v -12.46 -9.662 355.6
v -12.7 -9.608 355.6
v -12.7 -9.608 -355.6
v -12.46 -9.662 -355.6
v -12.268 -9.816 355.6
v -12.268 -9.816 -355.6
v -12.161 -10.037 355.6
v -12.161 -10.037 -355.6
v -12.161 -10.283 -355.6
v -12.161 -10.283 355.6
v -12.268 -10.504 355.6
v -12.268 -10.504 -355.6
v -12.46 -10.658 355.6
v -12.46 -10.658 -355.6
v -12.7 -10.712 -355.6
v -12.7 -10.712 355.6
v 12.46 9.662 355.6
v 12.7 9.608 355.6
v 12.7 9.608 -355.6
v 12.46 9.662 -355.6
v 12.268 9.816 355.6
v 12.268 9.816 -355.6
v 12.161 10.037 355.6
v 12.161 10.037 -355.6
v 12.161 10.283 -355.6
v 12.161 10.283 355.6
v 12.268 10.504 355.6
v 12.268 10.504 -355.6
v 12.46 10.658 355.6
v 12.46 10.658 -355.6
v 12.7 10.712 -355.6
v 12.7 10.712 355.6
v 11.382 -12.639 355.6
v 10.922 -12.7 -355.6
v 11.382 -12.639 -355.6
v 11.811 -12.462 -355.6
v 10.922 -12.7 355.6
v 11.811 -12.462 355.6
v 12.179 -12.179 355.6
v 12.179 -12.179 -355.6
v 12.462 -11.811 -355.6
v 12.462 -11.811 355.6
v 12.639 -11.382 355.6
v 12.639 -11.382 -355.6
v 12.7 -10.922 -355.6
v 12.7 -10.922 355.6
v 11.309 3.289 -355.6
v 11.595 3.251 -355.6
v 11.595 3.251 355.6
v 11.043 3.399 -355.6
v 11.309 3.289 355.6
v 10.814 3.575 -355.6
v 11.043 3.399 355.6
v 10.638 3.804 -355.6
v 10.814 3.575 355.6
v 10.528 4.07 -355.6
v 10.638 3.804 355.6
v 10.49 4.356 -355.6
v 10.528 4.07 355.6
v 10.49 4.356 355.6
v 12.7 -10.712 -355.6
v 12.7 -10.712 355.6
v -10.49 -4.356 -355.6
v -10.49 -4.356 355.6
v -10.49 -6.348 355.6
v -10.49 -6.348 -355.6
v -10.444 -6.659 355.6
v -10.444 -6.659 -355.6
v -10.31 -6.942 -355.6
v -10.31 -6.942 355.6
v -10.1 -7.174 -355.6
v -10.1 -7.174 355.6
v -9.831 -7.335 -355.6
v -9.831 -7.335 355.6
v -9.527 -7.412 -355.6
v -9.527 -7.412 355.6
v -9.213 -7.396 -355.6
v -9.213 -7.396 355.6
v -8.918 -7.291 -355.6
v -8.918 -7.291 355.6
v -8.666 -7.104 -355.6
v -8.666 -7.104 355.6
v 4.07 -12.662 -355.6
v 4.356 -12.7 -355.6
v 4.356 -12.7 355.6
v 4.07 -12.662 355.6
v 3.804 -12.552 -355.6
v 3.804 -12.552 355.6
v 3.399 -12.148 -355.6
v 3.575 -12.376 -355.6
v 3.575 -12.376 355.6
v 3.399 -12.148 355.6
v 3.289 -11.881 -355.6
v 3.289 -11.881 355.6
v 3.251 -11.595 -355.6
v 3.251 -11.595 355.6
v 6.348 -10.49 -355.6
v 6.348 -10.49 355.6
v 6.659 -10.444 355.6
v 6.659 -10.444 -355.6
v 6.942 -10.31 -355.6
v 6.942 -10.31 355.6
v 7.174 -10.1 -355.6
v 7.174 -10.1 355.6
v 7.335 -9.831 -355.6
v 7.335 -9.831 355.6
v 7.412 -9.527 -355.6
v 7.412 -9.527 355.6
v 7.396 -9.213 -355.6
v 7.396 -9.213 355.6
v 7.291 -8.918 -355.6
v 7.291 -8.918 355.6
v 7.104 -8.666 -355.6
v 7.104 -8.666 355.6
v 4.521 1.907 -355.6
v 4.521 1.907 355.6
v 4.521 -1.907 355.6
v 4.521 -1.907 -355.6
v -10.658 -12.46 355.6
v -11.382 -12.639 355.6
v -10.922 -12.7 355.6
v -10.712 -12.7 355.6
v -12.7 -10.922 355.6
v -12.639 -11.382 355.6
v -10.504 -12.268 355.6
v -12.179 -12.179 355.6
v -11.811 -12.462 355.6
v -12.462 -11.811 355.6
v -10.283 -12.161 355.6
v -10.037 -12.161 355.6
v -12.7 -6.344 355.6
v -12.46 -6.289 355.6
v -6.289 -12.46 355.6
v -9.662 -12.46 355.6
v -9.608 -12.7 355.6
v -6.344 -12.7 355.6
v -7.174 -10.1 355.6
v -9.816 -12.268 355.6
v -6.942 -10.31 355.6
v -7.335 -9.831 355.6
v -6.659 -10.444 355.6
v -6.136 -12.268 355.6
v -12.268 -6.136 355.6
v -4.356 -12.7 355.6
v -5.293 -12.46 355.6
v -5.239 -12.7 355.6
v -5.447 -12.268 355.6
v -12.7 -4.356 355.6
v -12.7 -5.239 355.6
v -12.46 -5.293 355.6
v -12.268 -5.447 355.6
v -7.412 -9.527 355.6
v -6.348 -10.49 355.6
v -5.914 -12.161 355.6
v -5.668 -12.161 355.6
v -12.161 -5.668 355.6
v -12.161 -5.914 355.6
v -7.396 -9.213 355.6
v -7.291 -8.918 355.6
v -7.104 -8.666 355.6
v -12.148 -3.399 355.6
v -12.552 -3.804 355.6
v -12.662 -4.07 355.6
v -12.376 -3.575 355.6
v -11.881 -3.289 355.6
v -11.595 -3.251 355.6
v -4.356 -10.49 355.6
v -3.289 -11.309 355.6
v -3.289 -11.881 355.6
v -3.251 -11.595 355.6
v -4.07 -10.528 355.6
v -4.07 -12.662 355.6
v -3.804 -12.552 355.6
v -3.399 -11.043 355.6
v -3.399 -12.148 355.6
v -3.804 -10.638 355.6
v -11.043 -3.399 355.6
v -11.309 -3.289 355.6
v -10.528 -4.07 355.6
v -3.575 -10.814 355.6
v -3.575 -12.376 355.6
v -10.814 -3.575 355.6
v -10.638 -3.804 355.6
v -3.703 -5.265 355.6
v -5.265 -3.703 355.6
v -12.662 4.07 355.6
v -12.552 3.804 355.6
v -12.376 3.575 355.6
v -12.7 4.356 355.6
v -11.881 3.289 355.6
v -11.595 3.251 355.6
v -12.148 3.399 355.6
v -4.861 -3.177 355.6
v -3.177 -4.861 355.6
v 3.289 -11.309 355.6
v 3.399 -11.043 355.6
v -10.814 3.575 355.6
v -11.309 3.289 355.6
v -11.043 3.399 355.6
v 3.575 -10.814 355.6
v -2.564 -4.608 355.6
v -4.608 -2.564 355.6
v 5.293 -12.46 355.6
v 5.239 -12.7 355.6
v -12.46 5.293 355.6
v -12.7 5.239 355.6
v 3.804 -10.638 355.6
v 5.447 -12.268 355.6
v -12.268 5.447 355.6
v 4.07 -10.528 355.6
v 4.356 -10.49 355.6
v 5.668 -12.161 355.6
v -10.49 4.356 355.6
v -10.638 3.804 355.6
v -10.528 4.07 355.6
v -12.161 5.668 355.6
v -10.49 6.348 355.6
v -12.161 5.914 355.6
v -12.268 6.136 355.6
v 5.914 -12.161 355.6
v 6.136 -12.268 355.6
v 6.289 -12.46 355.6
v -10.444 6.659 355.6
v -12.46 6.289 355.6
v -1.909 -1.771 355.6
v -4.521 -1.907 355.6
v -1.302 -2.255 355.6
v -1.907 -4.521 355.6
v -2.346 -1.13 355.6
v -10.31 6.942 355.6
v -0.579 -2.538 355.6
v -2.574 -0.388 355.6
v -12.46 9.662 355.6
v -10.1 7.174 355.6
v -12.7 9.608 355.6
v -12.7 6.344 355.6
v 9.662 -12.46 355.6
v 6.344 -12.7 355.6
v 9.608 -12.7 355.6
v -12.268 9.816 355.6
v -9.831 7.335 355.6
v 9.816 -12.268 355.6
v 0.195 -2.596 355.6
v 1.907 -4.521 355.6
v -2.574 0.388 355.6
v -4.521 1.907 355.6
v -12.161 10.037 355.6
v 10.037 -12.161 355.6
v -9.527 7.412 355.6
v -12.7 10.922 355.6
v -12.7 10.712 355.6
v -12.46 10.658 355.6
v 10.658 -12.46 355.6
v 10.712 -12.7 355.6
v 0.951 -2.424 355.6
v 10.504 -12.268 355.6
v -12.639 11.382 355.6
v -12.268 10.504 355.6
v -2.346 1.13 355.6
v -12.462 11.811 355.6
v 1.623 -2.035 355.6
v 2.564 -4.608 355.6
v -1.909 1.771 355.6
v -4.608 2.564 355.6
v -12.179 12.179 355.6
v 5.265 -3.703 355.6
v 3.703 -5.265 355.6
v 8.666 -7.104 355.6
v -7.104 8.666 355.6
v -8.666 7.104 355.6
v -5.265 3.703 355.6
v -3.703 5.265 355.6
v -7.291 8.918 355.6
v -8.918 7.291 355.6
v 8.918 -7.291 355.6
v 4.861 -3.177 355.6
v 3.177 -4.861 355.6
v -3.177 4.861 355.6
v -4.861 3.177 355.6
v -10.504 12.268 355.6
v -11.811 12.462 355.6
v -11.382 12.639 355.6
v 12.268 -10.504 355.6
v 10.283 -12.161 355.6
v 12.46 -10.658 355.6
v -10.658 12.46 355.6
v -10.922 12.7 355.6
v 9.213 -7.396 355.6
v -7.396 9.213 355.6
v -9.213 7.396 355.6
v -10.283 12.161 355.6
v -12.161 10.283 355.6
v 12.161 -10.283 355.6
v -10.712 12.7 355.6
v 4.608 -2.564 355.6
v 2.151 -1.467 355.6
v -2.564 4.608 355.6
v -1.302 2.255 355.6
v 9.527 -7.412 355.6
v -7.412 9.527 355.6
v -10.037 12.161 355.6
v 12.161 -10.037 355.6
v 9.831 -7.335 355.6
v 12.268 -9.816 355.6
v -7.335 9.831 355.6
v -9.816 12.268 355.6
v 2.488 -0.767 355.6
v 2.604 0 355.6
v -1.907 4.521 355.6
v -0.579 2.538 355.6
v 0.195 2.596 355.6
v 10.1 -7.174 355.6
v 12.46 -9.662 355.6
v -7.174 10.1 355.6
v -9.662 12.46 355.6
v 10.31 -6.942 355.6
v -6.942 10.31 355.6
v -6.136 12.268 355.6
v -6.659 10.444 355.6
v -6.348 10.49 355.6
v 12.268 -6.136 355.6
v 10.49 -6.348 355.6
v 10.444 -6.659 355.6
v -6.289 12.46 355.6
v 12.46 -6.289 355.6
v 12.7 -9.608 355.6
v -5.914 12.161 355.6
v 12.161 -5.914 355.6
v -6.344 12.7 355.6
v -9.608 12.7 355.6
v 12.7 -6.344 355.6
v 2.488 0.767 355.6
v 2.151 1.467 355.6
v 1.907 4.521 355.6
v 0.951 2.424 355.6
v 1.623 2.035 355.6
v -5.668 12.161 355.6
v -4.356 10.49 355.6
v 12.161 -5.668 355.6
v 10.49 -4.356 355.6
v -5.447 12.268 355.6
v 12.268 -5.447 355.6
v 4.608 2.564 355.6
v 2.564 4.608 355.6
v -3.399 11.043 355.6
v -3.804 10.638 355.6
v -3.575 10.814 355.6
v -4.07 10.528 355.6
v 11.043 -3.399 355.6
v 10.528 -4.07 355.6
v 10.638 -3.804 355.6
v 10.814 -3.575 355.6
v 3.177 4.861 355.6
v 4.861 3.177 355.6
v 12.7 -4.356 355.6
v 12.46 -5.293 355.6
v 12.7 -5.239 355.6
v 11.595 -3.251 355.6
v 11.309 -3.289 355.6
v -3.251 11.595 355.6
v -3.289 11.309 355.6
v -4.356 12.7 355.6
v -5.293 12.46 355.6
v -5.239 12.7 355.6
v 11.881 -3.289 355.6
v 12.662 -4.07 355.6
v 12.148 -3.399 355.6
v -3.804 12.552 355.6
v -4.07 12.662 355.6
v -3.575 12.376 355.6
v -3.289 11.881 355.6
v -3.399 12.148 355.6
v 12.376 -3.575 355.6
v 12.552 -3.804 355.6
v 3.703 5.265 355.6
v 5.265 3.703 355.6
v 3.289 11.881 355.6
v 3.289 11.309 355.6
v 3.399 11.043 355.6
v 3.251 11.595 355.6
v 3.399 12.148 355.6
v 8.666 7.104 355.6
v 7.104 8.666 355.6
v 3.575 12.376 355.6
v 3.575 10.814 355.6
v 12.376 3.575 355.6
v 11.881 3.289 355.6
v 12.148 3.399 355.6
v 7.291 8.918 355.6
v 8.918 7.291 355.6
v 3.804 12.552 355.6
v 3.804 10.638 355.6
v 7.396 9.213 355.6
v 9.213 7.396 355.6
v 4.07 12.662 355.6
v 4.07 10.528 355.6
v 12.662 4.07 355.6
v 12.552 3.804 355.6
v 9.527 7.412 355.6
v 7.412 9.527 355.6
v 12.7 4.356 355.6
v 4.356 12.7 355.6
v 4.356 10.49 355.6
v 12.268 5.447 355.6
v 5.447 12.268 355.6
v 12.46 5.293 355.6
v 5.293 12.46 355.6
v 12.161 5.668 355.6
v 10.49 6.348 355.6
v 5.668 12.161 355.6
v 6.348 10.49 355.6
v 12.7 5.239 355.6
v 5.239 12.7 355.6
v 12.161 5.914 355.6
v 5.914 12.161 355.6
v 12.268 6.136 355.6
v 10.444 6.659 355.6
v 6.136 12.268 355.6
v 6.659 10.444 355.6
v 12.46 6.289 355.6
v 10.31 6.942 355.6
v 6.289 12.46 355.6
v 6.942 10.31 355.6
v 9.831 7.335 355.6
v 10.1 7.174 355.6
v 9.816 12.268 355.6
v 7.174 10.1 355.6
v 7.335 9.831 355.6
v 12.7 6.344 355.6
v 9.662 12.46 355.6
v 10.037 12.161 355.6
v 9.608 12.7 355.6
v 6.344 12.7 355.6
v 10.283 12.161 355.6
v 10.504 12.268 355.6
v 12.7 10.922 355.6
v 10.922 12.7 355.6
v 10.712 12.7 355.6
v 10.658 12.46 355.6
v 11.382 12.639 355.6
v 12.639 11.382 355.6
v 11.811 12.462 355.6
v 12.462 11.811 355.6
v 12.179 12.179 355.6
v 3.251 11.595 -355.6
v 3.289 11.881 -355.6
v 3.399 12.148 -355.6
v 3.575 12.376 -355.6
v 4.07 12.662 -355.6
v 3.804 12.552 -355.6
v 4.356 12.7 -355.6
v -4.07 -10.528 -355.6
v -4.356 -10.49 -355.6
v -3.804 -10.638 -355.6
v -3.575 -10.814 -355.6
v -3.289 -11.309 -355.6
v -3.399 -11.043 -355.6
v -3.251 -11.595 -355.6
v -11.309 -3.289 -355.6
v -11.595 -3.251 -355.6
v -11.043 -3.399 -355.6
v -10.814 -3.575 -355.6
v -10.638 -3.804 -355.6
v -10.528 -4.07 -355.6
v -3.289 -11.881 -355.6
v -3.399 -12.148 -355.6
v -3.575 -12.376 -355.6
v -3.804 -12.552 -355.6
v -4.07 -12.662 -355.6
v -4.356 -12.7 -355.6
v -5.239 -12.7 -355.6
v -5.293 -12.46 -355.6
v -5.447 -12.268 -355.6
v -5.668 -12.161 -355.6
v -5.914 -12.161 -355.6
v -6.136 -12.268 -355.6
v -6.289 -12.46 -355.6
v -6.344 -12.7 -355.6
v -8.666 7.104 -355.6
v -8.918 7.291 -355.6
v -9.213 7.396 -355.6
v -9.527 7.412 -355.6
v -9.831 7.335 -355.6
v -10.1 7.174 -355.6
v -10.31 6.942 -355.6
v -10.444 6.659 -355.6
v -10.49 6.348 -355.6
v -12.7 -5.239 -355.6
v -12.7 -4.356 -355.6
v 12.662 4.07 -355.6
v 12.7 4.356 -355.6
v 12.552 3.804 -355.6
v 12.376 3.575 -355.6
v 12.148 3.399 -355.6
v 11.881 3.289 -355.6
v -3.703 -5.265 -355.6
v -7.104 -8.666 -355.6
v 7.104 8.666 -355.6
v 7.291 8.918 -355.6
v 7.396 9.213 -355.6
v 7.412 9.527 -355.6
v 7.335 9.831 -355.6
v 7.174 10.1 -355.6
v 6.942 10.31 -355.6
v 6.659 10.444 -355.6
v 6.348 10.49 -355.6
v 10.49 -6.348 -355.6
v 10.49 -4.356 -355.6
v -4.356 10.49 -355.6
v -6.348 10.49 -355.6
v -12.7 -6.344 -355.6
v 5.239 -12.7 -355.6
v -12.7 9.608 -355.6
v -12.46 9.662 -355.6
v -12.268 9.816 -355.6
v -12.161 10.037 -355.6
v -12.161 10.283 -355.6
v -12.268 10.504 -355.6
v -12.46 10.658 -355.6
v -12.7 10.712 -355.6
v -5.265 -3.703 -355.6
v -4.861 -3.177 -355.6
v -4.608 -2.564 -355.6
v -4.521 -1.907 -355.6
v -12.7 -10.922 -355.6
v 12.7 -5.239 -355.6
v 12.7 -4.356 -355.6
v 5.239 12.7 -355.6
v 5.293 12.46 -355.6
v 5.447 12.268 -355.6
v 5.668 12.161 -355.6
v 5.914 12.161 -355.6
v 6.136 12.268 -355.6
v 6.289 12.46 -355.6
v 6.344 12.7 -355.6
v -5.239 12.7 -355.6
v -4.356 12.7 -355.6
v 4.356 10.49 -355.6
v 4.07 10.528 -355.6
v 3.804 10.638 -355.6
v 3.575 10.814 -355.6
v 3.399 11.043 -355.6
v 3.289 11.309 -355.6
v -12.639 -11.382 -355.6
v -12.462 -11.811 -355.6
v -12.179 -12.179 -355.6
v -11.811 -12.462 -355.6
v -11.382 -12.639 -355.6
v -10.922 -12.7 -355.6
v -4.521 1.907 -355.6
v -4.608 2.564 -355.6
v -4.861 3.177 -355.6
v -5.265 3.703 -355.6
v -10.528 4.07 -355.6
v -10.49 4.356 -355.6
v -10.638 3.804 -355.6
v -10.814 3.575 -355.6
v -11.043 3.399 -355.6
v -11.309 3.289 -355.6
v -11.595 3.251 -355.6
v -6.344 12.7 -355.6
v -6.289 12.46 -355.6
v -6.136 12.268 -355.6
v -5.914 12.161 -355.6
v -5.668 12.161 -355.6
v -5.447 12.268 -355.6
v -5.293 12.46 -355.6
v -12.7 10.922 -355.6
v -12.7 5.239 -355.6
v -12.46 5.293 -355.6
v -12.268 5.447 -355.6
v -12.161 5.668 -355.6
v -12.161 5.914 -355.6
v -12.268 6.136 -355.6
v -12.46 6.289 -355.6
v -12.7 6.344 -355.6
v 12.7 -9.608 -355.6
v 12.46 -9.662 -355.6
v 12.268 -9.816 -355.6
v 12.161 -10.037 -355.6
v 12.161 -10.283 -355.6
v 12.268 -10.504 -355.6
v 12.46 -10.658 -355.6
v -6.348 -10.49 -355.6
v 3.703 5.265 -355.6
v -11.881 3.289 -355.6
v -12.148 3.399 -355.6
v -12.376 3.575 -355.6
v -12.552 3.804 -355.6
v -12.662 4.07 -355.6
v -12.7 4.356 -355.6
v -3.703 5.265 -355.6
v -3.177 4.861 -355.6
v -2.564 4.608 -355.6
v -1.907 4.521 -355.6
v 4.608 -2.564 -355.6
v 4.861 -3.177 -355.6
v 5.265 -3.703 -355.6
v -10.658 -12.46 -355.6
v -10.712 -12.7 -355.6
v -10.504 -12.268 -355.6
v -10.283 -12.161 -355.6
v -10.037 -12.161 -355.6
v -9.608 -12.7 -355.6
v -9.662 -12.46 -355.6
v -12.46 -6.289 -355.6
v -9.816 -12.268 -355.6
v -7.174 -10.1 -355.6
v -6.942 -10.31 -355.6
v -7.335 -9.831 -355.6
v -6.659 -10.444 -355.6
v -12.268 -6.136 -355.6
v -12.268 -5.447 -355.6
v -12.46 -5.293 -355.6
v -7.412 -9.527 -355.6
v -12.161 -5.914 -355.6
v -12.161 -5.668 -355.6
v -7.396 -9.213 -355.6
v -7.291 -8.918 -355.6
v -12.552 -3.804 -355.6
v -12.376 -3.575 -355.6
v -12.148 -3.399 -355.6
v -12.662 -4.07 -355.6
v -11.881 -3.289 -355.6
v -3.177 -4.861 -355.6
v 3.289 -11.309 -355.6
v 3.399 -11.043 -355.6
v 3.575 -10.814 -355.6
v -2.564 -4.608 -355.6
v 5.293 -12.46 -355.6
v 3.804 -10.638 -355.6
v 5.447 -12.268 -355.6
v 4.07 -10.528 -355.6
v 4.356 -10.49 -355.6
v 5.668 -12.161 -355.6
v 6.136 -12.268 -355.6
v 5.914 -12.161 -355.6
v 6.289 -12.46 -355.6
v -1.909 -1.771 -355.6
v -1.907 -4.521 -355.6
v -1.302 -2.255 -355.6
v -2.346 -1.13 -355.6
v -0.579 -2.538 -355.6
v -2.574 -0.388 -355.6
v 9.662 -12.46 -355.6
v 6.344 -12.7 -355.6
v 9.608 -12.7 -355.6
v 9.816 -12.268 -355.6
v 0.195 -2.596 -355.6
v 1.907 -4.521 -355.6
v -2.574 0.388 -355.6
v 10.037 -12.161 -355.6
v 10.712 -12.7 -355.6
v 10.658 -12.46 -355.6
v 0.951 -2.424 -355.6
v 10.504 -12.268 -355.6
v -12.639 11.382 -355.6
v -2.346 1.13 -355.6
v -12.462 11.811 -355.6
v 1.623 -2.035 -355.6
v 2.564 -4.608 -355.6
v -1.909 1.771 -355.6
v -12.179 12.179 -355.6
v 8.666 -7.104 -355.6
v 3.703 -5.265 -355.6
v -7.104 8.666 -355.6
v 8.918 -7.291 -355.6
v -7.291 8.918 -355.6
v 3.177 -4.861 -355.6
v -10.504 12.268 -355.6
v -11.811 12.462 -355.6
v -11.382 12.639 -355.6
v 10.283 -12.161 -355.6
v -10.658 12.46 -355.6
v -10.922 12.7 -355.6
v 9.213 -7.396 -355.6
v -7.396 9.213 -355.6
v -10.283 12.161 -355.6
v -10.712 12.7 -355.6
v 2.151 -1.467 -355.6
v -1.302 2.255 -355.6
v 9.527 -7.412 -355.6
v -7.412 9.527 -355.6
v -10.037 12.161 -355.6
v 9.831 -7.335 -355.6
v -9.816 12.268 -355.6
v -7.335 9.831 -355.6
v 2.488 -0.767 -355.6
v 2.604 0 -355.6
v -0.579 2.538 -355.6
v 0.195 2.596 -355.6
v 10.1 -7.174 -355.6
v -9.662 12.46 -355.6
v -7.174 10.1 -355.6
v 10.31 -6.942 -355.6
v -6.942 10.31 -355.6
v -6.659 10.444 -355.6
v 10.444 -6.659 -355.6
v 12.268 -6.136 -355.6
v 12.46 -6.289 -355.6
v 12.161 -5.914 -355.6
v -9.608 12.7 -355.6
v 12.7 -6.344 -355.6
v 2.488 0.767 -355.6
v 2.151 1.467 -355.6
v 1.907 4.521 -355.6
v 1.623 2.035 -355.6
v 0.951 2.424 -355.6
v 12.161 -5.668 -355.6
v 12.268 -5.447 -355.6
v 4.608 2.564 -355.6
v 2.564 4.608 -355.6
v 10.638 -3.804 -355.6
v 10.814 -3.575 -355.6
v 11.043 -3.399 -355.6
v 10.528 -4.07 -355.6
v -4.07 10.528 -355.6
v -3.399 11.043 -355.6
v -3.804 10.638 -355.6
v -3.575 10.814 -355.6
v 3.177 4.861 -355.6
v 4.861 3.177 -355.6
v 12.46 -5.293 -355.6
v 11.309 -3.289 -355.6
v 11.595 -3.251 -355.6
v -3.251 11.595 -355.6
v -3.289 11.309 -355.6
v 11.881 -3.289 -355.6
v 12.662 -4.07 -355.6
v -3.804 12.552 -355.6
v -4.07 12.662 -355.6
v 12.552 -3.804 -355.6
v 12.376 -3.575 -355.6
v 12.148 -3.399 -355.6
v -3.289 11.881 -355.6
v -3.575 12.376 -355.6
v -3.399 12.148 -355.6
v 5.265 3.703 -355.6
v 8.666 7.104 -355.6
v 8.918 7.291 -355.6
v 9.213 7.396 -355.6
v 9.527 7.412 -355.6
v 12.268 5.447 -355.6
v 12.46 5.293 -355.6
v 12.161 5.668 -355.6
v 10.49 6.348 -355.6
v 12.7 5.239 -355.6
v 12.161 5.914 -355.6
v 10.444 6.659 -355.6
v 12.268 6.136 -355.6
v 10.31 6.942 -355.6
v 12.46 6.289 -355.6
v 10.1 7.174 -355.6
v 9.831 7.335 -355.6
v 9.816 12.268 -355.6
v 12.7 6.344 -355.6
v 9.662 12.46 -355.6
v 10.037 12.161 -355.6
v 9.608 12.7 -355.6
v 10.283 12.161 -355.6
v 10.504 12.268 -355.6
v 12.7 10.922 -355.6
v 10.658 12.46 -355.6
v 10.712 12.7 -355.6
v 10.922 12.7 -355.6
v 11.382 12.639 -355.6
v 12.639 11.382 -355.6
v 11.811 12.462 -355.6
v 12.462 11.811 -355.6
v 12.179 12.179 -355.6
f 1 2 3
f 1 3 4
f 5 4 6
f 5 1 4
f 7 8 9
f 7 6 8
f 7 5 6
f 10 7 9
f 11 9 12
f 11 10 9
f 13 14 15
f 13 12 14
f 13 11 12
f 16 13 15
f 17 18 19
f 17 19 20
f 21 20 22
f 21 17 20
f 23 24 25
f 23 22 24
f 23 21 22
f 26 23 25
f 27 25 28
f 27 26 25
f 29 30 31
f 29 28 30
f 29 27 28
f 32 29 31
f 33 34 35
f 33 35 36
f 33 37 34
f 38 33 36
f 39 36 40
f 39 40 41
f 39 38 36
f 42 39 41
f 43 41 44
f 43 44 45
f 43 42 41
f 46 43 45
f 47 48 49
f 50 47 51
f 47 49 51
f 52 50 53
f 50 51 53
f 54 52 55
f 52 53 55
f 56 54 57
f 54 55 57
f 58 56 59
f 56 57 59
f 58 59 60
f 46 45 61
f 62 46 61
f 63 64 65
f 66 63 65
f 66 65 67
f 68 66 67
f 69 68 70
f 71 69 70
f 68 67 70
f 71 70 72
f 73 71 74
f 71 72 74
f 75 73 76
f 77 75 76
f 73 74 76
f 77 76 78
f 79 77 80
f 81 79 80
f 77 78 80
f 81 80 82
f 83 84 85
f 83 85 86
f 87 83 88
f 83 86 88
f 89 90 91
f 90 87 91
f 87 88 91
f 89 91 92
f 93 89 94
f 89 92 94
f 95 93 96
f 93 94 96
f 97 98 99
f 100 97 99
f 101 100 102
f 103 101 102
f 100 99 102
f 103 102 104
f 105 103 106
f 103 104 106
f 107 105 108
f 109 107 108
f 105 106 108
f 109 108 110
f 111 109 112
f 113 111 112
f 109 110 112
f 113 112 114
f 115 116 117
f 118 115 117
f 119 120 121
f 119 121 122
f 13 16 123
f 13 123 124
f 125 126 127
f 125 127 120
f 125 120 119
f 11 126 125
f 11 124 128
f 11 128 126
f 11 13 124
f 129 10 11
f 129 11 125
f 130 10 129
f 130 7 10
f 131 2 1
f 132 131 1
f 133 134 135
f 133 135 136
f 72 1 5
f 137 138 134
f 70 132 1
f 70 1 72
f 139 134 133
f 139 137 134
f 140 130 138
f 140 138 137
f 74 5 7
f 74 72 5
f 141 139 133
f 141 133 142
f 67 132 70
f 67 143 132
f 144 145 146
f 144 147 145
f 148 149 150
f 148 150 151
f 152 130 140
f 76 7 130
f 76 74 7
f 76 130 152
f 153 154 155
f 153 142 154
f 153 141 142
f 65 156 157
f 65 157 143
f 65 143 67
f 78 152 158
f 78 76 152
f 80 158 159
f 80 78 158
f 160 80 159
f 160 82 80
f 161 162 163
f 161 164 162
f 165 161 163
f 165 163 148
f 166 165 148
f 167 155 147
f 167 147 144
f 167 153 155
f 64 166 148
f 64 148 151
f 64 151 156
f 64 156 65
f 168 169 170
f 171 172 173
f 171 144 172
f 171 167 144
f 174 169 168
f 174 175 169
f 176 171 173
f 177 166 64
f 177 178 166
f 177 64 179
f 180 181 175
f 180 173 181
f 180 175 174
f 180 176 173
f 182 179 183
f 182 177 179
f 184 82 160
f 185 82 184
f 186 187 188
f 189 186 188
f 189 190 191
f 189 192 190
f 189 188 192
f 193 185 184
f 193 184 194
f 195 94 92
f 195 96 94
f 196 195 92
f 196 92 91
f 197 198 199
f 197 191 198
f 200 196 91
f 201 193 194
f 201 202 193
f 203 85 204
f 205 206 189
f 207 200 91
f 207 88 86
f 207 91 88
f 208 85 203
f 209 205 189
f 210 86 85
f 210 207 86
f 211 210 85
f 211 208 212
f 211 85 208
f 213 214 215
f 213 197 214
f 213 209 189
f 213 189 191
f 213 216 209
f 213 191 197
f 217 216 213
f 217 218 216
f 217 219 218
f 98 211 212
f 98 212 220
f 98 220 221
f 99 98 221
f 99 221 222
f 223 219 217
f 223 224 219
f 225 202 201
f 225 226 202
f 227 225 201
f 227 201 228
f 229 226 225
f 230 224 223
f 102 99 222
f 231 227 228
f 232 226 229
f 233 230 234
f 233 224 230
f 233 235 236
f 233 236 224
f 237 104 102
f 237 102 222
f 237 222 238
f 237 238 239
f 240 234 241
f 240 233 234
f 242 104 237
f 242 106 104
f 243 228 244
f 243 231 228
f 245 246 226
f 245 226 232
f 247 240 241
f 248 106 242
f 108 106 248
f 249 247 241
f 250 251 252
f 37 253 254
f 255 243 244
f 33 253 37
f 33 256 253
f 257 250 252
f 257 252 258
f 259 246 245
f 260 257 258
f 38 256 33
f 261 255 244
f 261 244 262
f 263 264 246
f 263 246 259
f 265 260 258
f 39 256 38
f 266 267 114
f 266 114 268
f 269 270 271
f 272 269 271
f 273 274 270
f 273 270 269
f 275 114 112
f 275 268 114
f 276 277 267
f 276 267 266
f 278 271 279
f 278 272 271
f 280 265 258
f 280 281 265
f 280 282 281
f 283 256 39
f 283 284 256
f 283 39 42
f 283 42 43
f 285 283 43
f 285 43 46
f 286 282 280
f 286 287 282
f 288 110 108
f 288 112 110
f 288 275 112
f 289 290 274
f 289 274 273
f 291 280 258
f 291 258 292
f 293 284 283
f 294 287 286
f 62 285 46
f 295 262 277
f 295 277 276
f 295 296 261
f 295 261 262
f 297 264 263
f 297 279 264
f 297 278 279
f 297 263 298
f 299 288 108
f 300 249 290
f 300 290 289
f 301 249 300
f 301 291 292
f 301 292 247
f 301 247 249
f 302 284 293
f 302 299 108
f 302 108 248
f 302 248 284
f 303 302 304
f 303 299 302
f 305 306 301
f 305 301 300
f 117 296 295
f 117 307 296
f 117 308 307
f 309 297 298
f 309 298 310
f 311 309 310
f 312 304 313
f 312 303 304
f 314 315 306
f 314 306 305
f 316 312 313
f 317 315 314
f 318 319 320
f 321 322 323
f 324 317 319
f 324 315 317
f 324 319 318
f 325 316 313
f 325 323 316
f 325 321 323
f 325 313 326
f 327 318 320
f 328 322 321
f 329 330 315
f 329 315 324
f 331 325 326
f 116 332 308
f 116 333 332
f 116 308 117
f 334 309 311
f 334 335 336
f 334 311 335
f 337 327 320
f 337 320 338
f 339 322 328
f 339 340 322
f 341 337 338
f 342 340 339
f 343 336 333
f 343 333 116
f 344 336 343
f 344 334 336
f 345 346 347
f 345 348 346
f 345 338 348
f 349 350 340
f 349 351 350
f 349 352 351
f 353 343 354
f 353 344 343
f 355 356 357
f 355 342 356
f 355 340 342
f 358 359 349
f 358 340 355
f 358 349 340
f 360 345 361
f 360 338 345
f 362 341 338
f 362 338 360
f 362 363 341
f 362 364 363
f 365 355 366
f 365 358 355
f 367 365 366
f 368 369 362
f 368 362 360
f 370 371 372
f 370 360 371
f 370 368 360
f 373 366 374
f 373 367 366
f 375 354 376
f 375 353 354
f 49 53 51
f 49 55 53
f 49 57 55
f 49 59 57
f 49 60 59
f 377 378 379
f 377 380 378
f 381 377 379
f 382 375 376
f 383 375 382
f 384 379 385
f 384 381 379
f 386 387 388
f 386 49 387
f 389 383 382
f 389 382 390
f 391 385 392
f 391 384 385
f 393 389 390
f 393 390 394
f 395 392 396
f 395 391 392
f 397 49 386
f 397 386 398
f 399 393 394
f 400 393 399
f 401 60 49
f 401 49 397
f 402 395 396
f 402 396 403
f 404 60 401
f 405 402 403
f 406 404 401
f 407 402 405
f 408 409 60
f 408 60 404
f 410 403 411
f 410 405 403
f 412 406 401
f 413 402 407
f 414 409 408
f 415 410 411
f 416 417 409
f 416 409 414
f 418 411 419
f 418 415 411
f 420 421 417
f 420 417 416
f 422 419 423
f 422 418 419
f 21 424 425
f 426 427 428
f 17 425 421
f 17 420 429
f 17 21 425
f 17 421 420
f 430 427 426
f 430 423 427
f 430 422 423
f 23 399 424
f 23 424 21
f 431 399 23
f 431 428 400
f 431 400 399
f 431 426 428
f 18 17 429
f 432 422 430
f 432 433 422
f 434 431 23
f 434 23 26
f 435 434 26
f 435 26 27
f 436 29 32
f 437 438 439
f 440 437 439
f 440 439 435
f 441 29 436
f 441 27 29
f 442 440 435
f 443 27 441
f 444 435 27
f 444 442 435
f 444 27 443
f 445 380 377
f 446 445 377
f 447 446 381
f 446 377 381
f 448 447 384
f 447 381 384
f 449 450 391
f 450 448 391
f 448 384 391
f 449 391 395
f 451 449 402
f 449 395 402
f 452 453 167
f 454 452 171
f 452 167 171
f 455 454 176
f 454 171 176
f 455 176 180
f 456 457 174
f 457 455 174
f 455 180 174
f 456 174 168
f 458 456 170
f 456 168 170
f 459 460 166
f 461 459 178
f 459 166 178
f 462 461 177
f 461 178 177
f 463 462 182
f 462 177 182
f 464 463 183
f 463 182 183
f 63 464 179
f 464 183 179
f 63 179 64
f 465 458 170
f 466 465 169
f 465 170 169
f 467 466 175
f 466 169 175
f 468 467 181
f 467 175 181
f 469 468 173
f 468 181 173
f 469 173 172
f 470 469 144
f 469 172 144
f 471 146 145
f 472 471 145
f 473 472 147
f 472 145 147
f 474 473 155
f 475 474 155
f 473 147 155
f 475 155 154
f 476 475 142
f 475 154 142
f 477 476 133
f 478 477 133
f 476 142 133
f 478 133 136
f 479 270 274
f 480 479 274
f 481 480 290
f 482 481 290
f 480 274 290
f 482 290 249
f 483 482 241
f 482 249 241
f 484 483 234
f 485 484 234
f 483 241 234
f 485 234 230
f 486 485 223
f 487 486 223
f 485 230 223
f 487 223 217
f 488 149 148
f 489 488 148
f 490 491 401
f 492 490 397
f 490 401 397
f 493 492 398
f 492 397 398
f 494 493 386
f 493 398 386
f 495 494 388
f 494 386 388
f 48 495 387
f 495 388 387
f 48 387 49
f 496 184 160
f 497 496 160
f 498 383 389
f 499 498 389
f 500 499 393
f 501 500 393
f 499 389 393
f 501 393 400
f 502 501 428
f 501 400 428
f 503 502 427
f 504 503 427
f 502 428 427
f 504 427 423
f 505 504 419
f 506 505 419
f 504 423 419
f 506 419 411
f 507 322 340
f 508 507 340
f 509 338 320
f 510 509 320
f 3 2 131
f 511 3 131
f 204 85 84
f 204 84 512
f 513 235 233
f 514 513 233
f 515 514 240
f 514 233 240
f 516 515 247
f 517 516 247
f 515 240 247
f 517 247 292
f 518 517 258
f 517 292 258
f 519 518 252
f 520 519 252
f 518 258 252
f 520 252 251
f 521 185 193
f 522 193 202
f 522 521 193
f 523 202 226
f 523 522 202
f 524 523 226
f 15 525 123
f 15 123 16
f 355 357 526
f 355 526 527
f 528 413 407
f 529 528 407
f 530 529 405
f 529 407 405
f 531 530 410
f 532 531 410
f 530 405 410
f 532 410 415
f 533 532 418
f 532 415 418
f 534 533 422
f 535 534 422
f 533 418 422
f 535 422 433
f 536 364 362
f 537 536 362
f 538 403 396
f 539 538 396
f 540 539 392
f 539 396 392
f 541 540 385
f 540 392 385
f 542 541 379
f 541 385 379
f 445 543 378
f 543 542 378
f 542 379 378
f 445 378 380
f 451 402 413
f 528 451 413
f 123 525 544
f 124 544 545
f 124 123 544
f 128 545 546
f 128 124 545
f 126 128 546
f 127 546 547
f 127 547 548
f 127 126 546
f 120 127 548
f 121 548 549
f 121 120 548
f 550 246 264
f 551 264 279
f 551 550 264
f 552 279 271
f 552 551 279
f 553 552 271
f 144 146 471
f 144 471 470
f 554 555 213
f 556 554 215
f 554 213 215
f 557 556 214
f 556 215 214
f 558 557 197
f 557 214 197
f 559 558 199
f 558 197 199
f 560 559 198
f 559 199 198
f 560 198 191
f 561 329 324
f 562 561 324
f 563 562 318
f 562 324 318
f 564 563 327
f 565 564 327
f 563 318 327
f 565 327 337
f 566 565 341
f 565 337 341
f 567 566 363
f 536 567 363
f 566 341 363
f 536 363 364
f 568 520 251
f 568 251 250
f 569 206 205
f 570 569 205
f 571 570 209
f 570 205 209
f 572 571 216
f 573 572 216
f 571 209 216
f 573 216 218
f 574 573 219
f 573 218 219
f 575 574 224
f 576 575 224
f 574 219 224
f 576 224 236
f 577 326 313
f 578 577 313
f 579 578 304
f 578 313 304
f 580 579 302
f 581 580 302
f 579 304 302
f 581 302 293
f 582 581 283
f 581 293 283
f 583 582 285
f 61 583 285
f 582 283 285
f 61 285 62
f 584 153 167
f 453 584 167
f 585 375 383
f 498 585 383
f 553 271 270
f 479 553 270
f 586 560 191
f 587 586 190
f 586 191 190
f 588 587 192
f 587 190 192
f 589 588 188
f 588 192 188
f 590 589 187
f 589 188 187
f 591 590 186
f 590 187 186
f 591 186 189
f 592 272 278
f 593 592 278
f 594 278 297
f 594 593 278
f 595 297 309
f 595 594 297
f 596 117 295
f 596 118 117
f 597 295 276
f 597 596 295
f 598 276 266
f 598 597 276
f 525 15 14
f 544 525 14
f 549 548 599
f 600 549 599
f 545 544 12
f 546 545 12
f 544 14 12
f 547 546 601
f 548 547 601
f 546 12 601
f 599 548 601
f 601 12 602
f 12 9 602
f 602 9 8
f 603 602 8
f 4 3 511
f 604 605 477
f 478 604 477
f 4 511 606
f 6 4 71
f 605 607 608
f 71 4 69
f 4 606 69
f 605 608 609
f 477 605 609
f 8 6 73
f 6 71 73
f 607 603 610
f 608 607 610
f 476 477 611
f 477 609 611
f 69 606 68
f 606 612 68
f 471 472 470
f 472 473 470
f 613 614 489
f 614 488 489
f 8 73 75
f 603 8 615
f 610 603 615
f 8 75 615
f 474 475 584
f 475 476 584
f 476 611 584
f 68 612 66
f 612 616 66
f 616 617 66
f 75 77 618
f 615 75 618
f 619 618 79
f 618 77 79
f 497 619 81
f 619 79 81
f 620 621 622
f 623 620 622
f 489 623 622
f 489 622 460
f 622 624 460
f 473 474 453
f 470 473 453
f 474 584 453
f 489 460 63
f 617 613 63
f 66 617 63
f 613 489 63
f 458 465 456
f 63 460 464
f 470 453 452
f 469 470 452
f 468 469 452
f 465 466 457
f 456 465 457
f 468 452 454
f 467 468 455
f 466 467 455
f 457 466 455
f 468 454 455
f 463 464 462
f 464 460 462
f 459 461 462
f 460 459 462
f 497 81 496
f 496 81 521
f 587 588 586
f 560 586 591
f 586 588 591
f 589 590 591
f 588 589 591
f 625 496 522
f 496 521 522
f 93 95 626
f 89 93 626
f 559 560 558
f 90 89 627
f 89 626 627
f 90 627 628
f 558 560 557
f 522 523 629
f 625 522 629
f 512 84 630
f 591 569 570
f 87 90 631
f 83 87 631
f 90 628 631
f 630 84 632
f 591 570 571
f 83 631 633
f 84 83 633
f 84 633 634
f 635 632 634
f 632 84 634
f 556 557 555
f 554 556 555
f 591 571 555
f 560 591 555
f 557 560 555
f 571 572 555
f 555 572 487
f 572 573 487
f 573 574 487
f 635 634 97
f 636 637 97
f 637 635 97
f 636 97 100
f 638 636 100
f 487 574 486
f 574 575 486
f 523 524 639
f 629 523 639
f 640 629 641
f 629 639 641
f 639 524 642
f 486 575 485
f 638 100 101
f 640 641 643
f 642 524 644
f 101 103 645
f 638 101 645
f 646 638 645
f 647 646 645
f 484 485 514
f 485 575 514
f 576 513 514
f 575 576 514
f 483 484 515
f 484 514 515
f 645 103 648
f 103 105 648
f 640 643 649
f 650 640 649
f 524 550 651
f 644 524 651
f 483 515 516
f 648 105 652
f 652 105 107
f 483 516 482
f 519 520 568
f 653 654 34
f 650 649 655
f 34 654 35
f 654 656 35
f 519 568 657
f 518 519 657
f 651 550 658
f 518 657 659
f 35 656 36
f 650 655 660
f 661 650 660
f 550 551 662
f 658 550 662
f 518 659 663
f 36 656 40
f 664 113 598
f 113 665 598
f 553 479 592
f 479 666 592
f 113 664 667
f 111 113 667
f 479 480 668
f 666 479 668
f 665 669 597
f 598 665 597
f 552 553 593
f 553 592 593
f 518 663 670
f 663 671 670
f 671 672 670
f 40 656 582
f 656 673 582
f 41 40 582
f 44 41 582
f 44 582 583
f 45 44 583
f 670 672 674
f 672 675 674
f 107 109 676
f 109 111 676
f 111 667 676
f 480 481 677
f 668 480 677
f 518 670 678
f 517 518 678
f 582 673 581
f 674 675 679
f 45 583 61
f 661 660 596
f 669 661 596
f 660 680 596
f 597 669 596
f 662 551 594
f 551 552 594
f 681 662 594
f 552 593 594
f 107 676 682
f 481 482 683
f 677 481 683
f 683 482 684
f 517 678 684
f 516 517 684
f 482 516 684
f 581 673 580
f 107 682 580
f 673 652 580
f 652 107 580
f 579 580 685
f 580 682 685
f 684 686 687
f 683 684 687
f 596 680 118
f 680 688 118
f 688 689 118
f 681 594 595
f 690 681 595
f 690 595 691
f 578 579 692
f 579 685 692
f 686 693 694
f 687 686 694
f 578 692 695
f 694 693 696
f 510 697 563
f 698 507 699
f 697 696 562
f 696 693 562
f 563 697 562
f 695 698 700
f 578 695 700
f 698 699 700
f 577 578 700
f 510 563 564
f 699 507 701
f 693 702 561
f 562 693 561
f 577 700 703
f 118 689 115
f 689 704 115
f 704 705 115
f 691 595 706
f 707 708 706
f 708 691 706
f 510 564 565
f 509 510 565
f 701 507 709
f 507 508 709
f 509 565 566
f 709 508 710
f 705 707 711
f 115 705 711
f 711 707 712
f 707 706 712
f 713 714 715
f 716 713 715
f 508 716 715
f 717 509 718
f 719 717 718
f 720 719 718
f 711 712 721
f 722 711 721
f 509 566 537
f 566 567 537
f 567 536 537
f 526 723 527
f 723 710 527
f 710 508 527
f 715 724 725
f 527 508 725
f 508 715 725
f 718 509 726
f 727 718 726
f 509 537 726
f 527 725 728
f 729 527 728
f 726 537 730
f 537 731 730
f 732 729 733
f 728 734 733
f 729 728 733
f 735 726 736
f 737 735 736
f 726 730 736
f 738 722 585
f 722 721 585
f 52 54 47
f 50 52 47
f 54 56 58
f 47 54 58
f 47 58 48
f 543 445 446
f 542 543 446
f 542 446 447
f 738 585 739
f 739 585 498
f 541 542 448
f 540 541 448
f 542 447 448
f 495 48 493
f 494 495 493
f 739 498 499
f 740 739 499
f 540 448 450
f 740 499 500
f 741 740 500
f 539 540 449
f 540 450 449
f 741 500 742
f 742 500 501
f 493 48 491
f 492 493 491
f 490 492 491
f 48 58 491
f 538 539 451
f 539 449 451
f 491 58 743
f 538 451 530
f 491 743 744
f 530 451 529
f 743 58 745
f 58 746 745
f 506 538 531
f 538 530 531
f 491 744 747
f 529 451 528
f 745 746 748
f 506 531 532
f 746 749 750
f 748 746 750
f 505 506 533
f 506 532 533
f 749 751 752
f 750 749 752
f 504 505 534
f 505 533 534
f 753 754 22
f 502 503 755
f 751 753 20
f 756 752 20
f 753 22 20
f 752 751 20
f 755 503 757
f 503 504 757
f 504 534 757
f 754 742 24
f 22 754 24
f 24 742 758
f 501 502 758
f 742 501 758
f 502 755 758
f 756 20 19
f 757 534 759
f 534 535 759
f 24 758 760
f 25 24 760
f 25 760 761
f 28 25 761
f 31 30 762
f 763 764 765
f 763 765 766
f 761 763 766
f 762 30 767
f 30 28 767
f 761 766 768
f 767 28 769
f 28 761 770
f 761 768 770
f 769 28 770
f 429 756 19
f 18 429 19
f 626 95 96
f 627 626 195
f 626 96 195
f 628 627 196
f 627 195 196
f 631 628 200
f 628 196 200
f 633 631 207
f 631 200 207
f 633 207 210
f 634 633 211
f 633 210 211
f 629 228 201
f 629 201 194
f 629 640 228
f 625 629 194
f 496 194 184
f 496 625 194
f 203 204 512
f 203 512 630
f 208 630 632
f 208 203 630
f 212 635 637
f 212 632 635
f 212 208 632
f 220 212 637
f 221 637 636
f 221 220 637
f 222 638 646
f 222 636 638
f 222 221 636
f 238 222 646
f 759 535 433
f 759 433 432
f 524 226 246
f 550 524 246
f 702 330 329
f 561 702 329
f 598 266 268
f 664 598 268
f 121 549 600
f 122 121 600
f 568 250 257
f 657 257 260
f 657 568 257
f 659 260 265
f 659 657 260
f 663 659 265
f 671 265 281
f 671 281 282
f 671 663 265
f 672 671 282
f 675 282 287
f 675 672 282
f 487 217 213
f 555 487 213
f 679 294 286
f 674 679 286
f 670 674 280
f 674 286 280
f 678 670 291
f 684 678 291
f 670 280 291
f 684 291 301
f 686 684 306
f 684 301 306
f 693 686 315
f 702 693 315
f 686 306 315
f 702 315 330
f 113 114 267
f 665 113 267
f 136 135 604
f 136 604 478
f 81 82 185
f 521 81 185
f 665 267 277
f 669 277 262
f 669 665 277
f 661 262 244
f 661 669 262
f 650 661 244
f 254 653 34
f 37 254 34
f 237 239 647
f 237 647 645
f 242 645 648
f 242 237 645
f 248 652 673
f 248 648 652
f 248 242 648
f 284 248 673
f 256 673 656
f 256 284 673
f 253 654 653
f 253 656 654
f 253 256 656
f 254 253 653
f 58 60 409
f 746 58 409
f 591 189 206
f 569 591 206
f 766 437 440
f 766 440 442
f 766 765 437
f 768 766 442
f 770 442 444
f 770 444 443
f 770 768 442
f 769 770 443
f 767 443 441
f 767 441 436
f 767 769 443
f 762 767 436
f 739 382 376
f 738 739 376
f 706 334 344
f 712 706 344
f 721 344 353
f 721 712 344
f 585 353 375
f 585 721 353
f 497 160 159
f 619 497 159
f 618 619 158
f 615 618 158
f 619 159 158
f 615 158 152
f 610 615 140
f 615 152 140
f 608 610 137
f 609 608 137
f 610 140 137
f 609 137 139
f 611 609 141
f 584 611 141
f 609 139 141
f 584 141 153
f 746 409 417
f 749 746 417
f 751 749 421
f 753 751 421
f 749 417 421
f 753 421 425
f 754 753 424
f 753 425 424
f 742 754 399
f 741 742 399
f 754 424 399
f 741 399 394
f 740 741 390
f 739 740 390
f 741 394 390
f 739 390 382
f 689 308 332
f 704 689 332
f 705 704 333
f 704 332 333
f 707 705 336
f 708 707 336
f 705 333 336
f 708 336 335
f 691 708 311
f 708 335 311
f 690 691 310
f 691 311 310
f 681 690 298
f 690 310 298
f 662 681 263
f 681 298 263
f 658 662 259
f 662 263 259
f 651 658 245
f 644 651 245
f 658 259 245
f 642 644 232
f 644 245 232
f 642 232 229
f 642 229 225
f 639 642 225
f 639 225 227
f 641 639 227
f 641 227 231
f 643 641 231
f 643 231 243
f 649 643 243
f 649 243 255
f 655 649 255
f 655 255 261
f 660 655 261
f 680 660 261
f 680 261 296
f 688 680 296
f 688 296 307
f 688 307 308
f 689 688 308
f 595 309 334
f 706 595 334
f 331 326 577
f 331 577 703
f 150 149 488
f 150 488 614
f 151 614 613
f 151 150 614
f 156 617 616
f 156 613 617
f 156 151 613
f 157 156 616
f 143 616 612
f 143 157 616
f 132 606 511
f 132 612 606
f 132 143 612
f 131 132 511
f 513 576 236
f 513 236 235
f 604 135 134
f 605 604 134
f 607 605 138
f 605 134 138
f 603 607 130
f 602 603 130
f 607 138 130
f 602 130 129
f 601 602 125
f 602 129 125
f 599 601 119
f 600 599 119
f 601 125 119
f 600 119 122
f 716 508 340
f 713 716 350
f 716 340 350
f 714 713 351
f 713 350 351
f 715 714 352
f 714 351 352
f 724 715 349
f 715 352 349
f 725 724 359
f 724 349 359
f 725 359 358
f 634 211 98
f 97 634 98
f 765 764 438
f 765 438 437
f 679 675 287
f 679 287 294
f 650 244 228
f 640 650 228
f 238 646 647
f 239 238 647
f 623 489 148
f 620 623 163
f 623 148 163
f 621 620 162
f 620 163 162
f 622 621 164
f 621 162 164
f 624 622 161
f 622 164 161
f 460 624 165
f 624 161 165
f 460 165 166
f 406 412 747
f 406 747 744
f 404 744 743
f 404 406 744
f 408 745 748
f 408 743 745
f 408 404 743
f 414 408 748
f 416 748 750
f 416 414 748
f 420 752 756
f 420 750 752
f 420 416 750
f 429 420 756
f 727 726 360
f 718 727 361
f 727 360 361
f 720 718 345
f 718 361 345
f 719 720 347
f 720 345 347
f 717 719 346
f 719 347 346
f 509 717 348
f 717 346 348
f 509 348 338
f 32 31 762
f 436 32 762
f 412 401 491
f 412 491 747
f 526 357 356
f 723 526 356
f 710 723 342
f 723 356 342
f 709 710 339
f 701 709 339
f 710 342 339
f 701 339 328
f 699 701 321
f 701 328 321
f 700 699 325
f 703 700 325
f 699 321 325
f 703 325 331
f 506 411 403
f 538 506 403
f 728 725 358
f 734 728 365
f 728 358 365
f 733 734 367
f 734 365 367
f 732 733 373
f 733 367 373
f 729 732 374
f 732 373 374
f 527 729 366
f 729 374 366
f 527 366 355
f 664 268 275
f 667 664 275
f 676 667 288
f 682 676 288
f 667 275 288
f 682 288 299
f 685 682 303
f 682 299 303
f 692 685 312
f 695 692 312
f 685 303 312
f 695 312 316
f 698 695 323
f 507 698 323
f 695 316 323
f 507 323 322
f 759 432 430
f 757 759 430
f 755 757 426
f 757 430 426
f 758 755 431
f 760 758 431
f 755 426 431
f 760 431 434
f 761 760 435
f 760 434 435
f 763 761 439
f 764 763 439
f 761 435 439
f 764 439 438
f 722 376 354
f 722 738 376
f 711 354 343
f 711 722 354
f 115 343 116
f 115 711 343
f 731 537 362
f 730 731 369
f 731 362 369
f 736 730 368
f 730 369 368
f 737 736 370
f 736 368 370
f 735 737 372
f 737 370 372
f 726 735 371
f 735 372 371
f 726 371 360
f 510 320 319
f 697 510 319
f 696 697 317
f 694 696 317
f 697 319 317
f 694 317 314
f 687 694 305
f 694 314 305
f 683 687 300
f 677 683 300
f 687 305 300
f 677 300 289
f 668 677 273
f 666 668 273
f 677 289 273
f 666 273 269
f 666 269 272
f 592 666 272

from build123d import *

# Parameters (mm, degrees)
SKETCH3_W                = 25.4
SKETCH3_H                = 25.4
BOSS_EXTRUDE1_DEPTH      = 355.6
BOSS_EXTRUDE1_DEPTH_BACK = 355.6
SKETCH4_R                = 2.6035
CUT_EXTRUDE1_DEPTH       = 712.2
CUT_EXTRUDE2_DEPTH       = 712.2
FILLET1_R                = 2.54
FILLET2_R                = 1.778


with BuildPart() as part:
    # Sketch3 → Boss-Extrude1 (new body, two sides)
    with BuildSketch(Plane.XY) as boss_extrude1_sk:
        Rectangle(SKETCH3_W, SKETCH3_H)
    extrude(amount=BOSS_EXTRUDE1_DEPTH)
    extrude(boss_extrude1_sk.sketch, amount=-BOSS_EXTRUDE1_DEPTH_BACK)

    # Sketch4 → Cut-Extrude1 (cut, through all)
    with BuildSketch(Plane.XY.offset(355.6)):
        with BuildLine():
            Line((3.2512, 12.7), (-3.2512, 12.7))
            Line((-3.2512, 12.7), (-3.2512, 10.4902))
            Line((-3.2512, 10.4902), (-6.348478019, 10.4902))
            ThreePointArc((-6.348478019, 10.4902), (-7.335478831, 9.830707141), (-7.103895736, 8.666460301))
            Line((-7.103895736, 8.666460301), (-2.958635435, 4.5212))
            Line((-2.958635435, 4.5212), (2.958635435, 4.5212))
            Line((2.958635435, 4.5212), (7.103895736, 8.666460301))
            ThreePointArc((7.103895736, 8.666460301), (7.335478831, 9.830707141), (6.348478019, 10.4902))
            Line((6.348478019, 10.4902), (3.2512, 10.4902))
            Line((3.2512, 10.4902), (3.2512, 12.7))
        make_face()
        with BuildLine():
            Line((12.7, -3.2512), (12.7, 3.2512))
            Line((12.7, 3.2512), (10.4902, 3.2512))
            Line((10.4902, 3.2512), (10.4902, 6.348478019))
            ThreePointArc((10.4902, 6.348478019), (9.830707141, 7.335478831), (8.666460301, 7.103895736))
            Line((8.666460301, 7.103895736), (4.5212, 2.958635435))
            Line((4.5212, 2.958635435), (4.5212, -2.958635435))
            Line((4.5212, -2.958635435), (8.666460301, -7.103895736))
            ThreePointArc((8.666460301, -7.103895736), (9.830707141, -7.335478831), (10.4902, -6.348478019))
            Line((10.4902, -6.348478019), (10.4902, -3.2512))
            Line((10.4902, -3.2512), (12.7, -3.2512))
        make_face()
        with BuildLine():
            Line((-3.2512, -10.4902), (-3.2512, -12.7))
            Line((-3.2512, -12.7), (3.2512, -12.7))
            Line((3.2512, -12.7), (3.2512, -10.4902))
            Line((3.2512, -10.4902), (6.348478019, -10.4902))
            ThreePointArc((6.348478019, -10.4902), (7.335478831, -9.830707141), (7.103895736, -8.666460301))
            Line((7.103895736, -8.666460301), (2.958635435, -4.5212))
            Line((2.958635435, -4.5212), (-2.958635435, -4.5212))
            Line((-2.958635435, -4.5212), (-7.103895736, -8.666460301))
            ThreePointArc((-7.103895736, -8.666460301), (-7.335478831, -9.830707141), (-6.348478019, -10.4902))
            Line((-6.348478019, -10.4902), (-3.2512, -10.4902))
        make_face()
        with BuildLine():
            Line((-10.4902, 3.2512), (-12.7, 3.2512))
            Line((-12.7, 3.2512), (-12.7, -3.2512))
            Line((-12.7, -3.2512), (-10.4902, -3.2512))
            Line((-10.4902, -3.2512), (-10.4902, -6.348478019))
            ThreePointArc((-10.4902, -6.348478019), (-9.830707141, -7.335478831), (-8.666460301, -7.103895736))
            Line((-8.666460301, -7.103895736), (-4.5212, -2.958635435))
            Line((-4.5212, -2.958635435), (-4.5212, 2.958635435))
            Line((-4.5212, 2.958635435), (-8.666460301, 7.103895736))
            ThreePointArc((-8.666460301, 7.103895736), (-9.830707141, 7.335478831), (-10.4902, 6.348478019))
            Line((-10.4902, 6.348478019), (-10.4902, 3.2512))
        make_face()
        Circle(SKETCH4_R)
    extrude(amount=-CUT_EXTRUDE1_DEPTH, mode=Mode.SUBTRACT)

    # Sketch5 → Cut-Extrude2 (cut, through all)
    with BuildSketch(Plane.XY.offset(355.6)):
        with BuildLine():
            ThreePointArc((-11.5951, 3.2512), (-12.376382283, 3.574817717), (-12.7, 4.3561))
            Line((-12.7, 4.3561), (-12.7, 3.2512))
            Line((-12.7, 3.2512), (-11.5951, 3.2512))
        make_face()
        with BuildLine():
            ThreePointArc((-10.4902, 4.3561), (-10.813817717, 3.574817717), (-11.5951, 3.2512))
            Line((-11.5951, 3.2512), (-10.4902, 3.2512))
            Line((-10.4902, 3.2512), (-10.4902, 4.3561))
        make_face()
        with BuildLine():
            Line((-12.7, -3.2512), (-12.7, -4.3561))
            ThreePointArc((-12.7, -4.3561), (-12.376382283, -3.574817717), (-11.5951, -3.2512))
            Line((-11.5951, -3.2512), (-12.7, -3.2512))
        make_face()
        with BuildLine():
            Line((-10.4902, -3.2512), (-11.5951, -3.2512))
            ThreePointArc((-11.5951, -3.2512), (-10.813817717, -3.574817717), (-10.4902, -4.3561))
            Line((-10.4902, -4.3561), (-10.4902, -3.2512))
        make_face()
        with BuildLine():
            Line((-3.2512, -11.595100007), (-3.2512, -10.4902))
            Line((-3.2512, -10.4902), (-4.3561, -10.4902))
            ThreePointArc((-4.3561, -10.4902), (-3.574817715, -10.81381772), (-3.2512, -11.595100007))
        make_face()
        with BuildLine():
            Line((-3.2512, -12.7), (-3.2512, -11.595100007))
            ThreePointArc((-3.2512, -11.595100007), (-3.57481772, -12.376382285), (-4.3561, -12.7))
            Line((-4.3561, -12.7), (-3.2512, -12.7))
        make_face()
        with BuildLine():
            Line((3.2512, -10.4902), (3.2512, -11.5951))
            ThreePointArc((3.2512, -11.5951), (3.574817718, -10.813817717), (4.3561, -10.4902))
            Line((4.3561, -10.4902), (3.2512, -10.4902))
        make_face()
        with BuildLine():
            Line((3.2512, -12.7), (4.3561, -12.7))
            ThreePointArc((4.3561, -12.7), (3.574817717, -12.376382282), (3.2512, -11.5951))
            Line((3.2512, -11.5951), (3.2512, -12.7))
        make_face()
        with BuildLine():
            Line((11.5951, -3.2512), (10.4902, -3.2512))
            Line((10.4902, -3.2512), (10.4902, -4.3561))
            ThreePointArc((10.4902, -4.3561), (10.813817717, -3.574817717), (11.5951, -3.2512))
        make_face()
        with BuildLine():
            Line((12.7, -3.2512), (11.5951, -3.2512))
            ThreePointArc((11.5951, -3.2512), (12.376382283, -3.574817717), (12.7, -4.3561))
            Line((12.7, -4.3561), (12.7, -3.2512))
        make_face()
        with BuildLine():
            Line((10.4902, 3.2512), (11.5951, 3.2512))
            ThreePointArc((11.5951, 3.2512), (10.813817717, 3.574817717), (10.4902, 4.3561))
            Line((10.4902, 4.3561), (10.4902, 3.2512))
        make_face()
        with BuildLine():
            Line((12.7, 3.2512), (12.7, 4.3561))
            ThreePointArc((12.7, 4.3561), (12.376382283, 3.574817717), (11.5951, 3.2512))
            Line((11.5951, 3.2512), (12.7, 3.2512))
        make_face()
        with BuildLine():
            Line((3.2512, 12.7), (3.2512, 11.595099996))
            ThreePointArc((3.2512, 11.595099996), (3.574817716, 12.376382281), (4.3561, 12.7))
            Line((4.3561, 12.7), (3.2512, 12.7))
        make_face()
        with BuildLine():
            Line((3.2512, 11.595099996), (3.2512, 10.4902))
            Line((3.2512, 10.4902), (4.3561, 10.4902))
            ThreePointArc((4.3561, 10.4902), (3.574817719, 10.813817716), (3.2512, 11.595099996))
        make_face()
        with BuildLine():
            Line((-3.2512, 12.7), (-4.3561, 12.7))
            ThreePointArc((-4.3561, 12.7), (-3.574817717, 12.376382283), (-3.2512, 11.5951))
            Line((-3.2512, 11.5951), (-3.2512, 12.7))
        make_face()
        with BuildLine():
            Line((-3.2512, 10.4902), (-3.2512, 11.5951))
            ThreePointArc((-3.2512, 11.5951), (-3.574817717, 10.813817717), (-4.3561, 10.4902))
            Line((-4.3561, 10.4902), (-3.2512, 10.4902))
        make_face()
        with BuildLine():
            ThreePointArc((-12.7, 5.23875), (-12.14755, 5.7912), (-12.7, 6.34365))
            Line((-12.7, 6.34365), (-12.7, 5.23875))
        make_face()
        with BuildLine():
            ThreePointArc((-12.7, 9.60755), (-12.14755, 10.16), (-12.7, 10.71245))
            Line((-12.7, 10.71245), (-12.7, 9.60755))
        make_face()
        with BuildLine():
            ThreePointArc((-10.71245, 12.7), (-10.16, 12.14755), (-9.60755, 12.7))
            Line((-9.60755, 12.7), (-10.71245, 12.7))
        make_face()
        with BuildLine():
            ThreePointArc((-6.34365, 12.7), (-5.7912, 12.14755), (-5.23875, 12.7))
            Line((-5.23875, 12.7), (-6.34365, 12.7))
        make_face()
        with BuildLine():
            Line((6.34365, 12.7), (5.23875, 12.7))
            ThreePointArc((5.23875, 12.7), (5.7912, 12.14755), (6.34365, 12.7))
        make_face()
        with BuildLine():
            Line((10.71245, 12.7), (9.60755, 12.7))
            ThreePointArc((9.60755, 12.7), (10.16, 12.14755), (10.71245, 12.7))
        make_face()
        with BuildLine():
            Line((12.7, 10.71245), (12.7, 9.60755))
            ThreePointArc((12.7, 9.60755), (12.14755, 10.16), (12.7, 10.71245))
        make_face()
        with BuildLine():
            Line((12.7, 6.34365), (12.7, 5.23875))
            ThreePointArc((12.7, 5.23875), (12.14755, 5.7912), (12.7, 6.34365))
        make_face()
        with BuildLine():
            Line((-12.7, -6.34365), (-12.7, -5.23875))
            ThreePointArc((-12.7, -5.23875), (-12.14755, -5.7912), (-12.7, -6.34365))
        make_face()
        with BuildLine():
            Line((-12.7, -10.71245), (-12.7, -9.60755))
            ThreePointArc((-12.7, -9.60755), (-12.14755, -10.16), (-12.7, -10.71245))
        make_face()
        with BuildLine():
            Line((-10.71245, -12.7), (-9.60755, -12.7))
            ThreePointArc((-9.60755, -12.7), (-10.16, -12.14755), (-10.71245, -12.7))
        make_face()
        with BuildLine():
            Line((-6.34365, -12.7), (-5.23875, -12.7))
            ThreePointArc((-5.23875, -12.7), (-5.7912, -12.14755), (-6.34365, -12.7))
        make_face()
        with BuildLine():
            Line((12.7, -10.71245), (12.7, -9.60755))
            ThreePointArc((12.7, -9.60755), (12.14755, -10.16), (12.7, -10.71245))
        make_face()
        with BuildLine():
            Line((12.7, -6.34365), (12.7, -5.23875))
            ThreePointArc((12.7, -5.23875), (12.14755, -5.7912), (12.7, -6.34365))
        make_face()
        with BuildLine():
            Line((10.71245, -12.7), (9.60755, -12.7))
            ThreePointArc((9.60755, -12.7), (10.16, -12.14755), (10.71245, -12.7))
        make_face()
        with BuildLine():
            Line((6.34365, -12.7), (5.23875, -12.7))
            ThreePointArc((5.23875, -12.7), (5.7912, -12.14755), (6.34365, -12.7))
        make_face()
    extrude(amount=-CUT_EXTRUDE2_DEPTH, mode=Mode.SUBTRACT)

    # Fillet1
    fillet1_edges = [part.edges().sort_by_distance(p)[0] for p in [
        (2.958635435, 4.5212, 0),
        (-2.958635435, 4.5212, 0),
        (-2.958635435, -4.5212, 0),
        (2.958635435, -4.5212, 0),
        (4.5212, -2.958635435, 0),
        (4.5212, 2.958635435, 0),
        (-4.5212, 2.958635435, 0),
        (-4.5212, -2.958635435, 0),
    ]]
    fillet(fillet1_edges, radius=FILLET1_R)

    # Fillet2
    fillet2_edges = [part.edges().sort_by_distance(p)[0] for p in [
        (-12.7, 12.7, 0),
        (12.7, 12.7, 0),
        (12.7, -12.7, 0),
        (-12.7, -12.7, 0),
    ]]
    fillet(fillet2_edges, radius=FILLET2_R)


solid = part.part
